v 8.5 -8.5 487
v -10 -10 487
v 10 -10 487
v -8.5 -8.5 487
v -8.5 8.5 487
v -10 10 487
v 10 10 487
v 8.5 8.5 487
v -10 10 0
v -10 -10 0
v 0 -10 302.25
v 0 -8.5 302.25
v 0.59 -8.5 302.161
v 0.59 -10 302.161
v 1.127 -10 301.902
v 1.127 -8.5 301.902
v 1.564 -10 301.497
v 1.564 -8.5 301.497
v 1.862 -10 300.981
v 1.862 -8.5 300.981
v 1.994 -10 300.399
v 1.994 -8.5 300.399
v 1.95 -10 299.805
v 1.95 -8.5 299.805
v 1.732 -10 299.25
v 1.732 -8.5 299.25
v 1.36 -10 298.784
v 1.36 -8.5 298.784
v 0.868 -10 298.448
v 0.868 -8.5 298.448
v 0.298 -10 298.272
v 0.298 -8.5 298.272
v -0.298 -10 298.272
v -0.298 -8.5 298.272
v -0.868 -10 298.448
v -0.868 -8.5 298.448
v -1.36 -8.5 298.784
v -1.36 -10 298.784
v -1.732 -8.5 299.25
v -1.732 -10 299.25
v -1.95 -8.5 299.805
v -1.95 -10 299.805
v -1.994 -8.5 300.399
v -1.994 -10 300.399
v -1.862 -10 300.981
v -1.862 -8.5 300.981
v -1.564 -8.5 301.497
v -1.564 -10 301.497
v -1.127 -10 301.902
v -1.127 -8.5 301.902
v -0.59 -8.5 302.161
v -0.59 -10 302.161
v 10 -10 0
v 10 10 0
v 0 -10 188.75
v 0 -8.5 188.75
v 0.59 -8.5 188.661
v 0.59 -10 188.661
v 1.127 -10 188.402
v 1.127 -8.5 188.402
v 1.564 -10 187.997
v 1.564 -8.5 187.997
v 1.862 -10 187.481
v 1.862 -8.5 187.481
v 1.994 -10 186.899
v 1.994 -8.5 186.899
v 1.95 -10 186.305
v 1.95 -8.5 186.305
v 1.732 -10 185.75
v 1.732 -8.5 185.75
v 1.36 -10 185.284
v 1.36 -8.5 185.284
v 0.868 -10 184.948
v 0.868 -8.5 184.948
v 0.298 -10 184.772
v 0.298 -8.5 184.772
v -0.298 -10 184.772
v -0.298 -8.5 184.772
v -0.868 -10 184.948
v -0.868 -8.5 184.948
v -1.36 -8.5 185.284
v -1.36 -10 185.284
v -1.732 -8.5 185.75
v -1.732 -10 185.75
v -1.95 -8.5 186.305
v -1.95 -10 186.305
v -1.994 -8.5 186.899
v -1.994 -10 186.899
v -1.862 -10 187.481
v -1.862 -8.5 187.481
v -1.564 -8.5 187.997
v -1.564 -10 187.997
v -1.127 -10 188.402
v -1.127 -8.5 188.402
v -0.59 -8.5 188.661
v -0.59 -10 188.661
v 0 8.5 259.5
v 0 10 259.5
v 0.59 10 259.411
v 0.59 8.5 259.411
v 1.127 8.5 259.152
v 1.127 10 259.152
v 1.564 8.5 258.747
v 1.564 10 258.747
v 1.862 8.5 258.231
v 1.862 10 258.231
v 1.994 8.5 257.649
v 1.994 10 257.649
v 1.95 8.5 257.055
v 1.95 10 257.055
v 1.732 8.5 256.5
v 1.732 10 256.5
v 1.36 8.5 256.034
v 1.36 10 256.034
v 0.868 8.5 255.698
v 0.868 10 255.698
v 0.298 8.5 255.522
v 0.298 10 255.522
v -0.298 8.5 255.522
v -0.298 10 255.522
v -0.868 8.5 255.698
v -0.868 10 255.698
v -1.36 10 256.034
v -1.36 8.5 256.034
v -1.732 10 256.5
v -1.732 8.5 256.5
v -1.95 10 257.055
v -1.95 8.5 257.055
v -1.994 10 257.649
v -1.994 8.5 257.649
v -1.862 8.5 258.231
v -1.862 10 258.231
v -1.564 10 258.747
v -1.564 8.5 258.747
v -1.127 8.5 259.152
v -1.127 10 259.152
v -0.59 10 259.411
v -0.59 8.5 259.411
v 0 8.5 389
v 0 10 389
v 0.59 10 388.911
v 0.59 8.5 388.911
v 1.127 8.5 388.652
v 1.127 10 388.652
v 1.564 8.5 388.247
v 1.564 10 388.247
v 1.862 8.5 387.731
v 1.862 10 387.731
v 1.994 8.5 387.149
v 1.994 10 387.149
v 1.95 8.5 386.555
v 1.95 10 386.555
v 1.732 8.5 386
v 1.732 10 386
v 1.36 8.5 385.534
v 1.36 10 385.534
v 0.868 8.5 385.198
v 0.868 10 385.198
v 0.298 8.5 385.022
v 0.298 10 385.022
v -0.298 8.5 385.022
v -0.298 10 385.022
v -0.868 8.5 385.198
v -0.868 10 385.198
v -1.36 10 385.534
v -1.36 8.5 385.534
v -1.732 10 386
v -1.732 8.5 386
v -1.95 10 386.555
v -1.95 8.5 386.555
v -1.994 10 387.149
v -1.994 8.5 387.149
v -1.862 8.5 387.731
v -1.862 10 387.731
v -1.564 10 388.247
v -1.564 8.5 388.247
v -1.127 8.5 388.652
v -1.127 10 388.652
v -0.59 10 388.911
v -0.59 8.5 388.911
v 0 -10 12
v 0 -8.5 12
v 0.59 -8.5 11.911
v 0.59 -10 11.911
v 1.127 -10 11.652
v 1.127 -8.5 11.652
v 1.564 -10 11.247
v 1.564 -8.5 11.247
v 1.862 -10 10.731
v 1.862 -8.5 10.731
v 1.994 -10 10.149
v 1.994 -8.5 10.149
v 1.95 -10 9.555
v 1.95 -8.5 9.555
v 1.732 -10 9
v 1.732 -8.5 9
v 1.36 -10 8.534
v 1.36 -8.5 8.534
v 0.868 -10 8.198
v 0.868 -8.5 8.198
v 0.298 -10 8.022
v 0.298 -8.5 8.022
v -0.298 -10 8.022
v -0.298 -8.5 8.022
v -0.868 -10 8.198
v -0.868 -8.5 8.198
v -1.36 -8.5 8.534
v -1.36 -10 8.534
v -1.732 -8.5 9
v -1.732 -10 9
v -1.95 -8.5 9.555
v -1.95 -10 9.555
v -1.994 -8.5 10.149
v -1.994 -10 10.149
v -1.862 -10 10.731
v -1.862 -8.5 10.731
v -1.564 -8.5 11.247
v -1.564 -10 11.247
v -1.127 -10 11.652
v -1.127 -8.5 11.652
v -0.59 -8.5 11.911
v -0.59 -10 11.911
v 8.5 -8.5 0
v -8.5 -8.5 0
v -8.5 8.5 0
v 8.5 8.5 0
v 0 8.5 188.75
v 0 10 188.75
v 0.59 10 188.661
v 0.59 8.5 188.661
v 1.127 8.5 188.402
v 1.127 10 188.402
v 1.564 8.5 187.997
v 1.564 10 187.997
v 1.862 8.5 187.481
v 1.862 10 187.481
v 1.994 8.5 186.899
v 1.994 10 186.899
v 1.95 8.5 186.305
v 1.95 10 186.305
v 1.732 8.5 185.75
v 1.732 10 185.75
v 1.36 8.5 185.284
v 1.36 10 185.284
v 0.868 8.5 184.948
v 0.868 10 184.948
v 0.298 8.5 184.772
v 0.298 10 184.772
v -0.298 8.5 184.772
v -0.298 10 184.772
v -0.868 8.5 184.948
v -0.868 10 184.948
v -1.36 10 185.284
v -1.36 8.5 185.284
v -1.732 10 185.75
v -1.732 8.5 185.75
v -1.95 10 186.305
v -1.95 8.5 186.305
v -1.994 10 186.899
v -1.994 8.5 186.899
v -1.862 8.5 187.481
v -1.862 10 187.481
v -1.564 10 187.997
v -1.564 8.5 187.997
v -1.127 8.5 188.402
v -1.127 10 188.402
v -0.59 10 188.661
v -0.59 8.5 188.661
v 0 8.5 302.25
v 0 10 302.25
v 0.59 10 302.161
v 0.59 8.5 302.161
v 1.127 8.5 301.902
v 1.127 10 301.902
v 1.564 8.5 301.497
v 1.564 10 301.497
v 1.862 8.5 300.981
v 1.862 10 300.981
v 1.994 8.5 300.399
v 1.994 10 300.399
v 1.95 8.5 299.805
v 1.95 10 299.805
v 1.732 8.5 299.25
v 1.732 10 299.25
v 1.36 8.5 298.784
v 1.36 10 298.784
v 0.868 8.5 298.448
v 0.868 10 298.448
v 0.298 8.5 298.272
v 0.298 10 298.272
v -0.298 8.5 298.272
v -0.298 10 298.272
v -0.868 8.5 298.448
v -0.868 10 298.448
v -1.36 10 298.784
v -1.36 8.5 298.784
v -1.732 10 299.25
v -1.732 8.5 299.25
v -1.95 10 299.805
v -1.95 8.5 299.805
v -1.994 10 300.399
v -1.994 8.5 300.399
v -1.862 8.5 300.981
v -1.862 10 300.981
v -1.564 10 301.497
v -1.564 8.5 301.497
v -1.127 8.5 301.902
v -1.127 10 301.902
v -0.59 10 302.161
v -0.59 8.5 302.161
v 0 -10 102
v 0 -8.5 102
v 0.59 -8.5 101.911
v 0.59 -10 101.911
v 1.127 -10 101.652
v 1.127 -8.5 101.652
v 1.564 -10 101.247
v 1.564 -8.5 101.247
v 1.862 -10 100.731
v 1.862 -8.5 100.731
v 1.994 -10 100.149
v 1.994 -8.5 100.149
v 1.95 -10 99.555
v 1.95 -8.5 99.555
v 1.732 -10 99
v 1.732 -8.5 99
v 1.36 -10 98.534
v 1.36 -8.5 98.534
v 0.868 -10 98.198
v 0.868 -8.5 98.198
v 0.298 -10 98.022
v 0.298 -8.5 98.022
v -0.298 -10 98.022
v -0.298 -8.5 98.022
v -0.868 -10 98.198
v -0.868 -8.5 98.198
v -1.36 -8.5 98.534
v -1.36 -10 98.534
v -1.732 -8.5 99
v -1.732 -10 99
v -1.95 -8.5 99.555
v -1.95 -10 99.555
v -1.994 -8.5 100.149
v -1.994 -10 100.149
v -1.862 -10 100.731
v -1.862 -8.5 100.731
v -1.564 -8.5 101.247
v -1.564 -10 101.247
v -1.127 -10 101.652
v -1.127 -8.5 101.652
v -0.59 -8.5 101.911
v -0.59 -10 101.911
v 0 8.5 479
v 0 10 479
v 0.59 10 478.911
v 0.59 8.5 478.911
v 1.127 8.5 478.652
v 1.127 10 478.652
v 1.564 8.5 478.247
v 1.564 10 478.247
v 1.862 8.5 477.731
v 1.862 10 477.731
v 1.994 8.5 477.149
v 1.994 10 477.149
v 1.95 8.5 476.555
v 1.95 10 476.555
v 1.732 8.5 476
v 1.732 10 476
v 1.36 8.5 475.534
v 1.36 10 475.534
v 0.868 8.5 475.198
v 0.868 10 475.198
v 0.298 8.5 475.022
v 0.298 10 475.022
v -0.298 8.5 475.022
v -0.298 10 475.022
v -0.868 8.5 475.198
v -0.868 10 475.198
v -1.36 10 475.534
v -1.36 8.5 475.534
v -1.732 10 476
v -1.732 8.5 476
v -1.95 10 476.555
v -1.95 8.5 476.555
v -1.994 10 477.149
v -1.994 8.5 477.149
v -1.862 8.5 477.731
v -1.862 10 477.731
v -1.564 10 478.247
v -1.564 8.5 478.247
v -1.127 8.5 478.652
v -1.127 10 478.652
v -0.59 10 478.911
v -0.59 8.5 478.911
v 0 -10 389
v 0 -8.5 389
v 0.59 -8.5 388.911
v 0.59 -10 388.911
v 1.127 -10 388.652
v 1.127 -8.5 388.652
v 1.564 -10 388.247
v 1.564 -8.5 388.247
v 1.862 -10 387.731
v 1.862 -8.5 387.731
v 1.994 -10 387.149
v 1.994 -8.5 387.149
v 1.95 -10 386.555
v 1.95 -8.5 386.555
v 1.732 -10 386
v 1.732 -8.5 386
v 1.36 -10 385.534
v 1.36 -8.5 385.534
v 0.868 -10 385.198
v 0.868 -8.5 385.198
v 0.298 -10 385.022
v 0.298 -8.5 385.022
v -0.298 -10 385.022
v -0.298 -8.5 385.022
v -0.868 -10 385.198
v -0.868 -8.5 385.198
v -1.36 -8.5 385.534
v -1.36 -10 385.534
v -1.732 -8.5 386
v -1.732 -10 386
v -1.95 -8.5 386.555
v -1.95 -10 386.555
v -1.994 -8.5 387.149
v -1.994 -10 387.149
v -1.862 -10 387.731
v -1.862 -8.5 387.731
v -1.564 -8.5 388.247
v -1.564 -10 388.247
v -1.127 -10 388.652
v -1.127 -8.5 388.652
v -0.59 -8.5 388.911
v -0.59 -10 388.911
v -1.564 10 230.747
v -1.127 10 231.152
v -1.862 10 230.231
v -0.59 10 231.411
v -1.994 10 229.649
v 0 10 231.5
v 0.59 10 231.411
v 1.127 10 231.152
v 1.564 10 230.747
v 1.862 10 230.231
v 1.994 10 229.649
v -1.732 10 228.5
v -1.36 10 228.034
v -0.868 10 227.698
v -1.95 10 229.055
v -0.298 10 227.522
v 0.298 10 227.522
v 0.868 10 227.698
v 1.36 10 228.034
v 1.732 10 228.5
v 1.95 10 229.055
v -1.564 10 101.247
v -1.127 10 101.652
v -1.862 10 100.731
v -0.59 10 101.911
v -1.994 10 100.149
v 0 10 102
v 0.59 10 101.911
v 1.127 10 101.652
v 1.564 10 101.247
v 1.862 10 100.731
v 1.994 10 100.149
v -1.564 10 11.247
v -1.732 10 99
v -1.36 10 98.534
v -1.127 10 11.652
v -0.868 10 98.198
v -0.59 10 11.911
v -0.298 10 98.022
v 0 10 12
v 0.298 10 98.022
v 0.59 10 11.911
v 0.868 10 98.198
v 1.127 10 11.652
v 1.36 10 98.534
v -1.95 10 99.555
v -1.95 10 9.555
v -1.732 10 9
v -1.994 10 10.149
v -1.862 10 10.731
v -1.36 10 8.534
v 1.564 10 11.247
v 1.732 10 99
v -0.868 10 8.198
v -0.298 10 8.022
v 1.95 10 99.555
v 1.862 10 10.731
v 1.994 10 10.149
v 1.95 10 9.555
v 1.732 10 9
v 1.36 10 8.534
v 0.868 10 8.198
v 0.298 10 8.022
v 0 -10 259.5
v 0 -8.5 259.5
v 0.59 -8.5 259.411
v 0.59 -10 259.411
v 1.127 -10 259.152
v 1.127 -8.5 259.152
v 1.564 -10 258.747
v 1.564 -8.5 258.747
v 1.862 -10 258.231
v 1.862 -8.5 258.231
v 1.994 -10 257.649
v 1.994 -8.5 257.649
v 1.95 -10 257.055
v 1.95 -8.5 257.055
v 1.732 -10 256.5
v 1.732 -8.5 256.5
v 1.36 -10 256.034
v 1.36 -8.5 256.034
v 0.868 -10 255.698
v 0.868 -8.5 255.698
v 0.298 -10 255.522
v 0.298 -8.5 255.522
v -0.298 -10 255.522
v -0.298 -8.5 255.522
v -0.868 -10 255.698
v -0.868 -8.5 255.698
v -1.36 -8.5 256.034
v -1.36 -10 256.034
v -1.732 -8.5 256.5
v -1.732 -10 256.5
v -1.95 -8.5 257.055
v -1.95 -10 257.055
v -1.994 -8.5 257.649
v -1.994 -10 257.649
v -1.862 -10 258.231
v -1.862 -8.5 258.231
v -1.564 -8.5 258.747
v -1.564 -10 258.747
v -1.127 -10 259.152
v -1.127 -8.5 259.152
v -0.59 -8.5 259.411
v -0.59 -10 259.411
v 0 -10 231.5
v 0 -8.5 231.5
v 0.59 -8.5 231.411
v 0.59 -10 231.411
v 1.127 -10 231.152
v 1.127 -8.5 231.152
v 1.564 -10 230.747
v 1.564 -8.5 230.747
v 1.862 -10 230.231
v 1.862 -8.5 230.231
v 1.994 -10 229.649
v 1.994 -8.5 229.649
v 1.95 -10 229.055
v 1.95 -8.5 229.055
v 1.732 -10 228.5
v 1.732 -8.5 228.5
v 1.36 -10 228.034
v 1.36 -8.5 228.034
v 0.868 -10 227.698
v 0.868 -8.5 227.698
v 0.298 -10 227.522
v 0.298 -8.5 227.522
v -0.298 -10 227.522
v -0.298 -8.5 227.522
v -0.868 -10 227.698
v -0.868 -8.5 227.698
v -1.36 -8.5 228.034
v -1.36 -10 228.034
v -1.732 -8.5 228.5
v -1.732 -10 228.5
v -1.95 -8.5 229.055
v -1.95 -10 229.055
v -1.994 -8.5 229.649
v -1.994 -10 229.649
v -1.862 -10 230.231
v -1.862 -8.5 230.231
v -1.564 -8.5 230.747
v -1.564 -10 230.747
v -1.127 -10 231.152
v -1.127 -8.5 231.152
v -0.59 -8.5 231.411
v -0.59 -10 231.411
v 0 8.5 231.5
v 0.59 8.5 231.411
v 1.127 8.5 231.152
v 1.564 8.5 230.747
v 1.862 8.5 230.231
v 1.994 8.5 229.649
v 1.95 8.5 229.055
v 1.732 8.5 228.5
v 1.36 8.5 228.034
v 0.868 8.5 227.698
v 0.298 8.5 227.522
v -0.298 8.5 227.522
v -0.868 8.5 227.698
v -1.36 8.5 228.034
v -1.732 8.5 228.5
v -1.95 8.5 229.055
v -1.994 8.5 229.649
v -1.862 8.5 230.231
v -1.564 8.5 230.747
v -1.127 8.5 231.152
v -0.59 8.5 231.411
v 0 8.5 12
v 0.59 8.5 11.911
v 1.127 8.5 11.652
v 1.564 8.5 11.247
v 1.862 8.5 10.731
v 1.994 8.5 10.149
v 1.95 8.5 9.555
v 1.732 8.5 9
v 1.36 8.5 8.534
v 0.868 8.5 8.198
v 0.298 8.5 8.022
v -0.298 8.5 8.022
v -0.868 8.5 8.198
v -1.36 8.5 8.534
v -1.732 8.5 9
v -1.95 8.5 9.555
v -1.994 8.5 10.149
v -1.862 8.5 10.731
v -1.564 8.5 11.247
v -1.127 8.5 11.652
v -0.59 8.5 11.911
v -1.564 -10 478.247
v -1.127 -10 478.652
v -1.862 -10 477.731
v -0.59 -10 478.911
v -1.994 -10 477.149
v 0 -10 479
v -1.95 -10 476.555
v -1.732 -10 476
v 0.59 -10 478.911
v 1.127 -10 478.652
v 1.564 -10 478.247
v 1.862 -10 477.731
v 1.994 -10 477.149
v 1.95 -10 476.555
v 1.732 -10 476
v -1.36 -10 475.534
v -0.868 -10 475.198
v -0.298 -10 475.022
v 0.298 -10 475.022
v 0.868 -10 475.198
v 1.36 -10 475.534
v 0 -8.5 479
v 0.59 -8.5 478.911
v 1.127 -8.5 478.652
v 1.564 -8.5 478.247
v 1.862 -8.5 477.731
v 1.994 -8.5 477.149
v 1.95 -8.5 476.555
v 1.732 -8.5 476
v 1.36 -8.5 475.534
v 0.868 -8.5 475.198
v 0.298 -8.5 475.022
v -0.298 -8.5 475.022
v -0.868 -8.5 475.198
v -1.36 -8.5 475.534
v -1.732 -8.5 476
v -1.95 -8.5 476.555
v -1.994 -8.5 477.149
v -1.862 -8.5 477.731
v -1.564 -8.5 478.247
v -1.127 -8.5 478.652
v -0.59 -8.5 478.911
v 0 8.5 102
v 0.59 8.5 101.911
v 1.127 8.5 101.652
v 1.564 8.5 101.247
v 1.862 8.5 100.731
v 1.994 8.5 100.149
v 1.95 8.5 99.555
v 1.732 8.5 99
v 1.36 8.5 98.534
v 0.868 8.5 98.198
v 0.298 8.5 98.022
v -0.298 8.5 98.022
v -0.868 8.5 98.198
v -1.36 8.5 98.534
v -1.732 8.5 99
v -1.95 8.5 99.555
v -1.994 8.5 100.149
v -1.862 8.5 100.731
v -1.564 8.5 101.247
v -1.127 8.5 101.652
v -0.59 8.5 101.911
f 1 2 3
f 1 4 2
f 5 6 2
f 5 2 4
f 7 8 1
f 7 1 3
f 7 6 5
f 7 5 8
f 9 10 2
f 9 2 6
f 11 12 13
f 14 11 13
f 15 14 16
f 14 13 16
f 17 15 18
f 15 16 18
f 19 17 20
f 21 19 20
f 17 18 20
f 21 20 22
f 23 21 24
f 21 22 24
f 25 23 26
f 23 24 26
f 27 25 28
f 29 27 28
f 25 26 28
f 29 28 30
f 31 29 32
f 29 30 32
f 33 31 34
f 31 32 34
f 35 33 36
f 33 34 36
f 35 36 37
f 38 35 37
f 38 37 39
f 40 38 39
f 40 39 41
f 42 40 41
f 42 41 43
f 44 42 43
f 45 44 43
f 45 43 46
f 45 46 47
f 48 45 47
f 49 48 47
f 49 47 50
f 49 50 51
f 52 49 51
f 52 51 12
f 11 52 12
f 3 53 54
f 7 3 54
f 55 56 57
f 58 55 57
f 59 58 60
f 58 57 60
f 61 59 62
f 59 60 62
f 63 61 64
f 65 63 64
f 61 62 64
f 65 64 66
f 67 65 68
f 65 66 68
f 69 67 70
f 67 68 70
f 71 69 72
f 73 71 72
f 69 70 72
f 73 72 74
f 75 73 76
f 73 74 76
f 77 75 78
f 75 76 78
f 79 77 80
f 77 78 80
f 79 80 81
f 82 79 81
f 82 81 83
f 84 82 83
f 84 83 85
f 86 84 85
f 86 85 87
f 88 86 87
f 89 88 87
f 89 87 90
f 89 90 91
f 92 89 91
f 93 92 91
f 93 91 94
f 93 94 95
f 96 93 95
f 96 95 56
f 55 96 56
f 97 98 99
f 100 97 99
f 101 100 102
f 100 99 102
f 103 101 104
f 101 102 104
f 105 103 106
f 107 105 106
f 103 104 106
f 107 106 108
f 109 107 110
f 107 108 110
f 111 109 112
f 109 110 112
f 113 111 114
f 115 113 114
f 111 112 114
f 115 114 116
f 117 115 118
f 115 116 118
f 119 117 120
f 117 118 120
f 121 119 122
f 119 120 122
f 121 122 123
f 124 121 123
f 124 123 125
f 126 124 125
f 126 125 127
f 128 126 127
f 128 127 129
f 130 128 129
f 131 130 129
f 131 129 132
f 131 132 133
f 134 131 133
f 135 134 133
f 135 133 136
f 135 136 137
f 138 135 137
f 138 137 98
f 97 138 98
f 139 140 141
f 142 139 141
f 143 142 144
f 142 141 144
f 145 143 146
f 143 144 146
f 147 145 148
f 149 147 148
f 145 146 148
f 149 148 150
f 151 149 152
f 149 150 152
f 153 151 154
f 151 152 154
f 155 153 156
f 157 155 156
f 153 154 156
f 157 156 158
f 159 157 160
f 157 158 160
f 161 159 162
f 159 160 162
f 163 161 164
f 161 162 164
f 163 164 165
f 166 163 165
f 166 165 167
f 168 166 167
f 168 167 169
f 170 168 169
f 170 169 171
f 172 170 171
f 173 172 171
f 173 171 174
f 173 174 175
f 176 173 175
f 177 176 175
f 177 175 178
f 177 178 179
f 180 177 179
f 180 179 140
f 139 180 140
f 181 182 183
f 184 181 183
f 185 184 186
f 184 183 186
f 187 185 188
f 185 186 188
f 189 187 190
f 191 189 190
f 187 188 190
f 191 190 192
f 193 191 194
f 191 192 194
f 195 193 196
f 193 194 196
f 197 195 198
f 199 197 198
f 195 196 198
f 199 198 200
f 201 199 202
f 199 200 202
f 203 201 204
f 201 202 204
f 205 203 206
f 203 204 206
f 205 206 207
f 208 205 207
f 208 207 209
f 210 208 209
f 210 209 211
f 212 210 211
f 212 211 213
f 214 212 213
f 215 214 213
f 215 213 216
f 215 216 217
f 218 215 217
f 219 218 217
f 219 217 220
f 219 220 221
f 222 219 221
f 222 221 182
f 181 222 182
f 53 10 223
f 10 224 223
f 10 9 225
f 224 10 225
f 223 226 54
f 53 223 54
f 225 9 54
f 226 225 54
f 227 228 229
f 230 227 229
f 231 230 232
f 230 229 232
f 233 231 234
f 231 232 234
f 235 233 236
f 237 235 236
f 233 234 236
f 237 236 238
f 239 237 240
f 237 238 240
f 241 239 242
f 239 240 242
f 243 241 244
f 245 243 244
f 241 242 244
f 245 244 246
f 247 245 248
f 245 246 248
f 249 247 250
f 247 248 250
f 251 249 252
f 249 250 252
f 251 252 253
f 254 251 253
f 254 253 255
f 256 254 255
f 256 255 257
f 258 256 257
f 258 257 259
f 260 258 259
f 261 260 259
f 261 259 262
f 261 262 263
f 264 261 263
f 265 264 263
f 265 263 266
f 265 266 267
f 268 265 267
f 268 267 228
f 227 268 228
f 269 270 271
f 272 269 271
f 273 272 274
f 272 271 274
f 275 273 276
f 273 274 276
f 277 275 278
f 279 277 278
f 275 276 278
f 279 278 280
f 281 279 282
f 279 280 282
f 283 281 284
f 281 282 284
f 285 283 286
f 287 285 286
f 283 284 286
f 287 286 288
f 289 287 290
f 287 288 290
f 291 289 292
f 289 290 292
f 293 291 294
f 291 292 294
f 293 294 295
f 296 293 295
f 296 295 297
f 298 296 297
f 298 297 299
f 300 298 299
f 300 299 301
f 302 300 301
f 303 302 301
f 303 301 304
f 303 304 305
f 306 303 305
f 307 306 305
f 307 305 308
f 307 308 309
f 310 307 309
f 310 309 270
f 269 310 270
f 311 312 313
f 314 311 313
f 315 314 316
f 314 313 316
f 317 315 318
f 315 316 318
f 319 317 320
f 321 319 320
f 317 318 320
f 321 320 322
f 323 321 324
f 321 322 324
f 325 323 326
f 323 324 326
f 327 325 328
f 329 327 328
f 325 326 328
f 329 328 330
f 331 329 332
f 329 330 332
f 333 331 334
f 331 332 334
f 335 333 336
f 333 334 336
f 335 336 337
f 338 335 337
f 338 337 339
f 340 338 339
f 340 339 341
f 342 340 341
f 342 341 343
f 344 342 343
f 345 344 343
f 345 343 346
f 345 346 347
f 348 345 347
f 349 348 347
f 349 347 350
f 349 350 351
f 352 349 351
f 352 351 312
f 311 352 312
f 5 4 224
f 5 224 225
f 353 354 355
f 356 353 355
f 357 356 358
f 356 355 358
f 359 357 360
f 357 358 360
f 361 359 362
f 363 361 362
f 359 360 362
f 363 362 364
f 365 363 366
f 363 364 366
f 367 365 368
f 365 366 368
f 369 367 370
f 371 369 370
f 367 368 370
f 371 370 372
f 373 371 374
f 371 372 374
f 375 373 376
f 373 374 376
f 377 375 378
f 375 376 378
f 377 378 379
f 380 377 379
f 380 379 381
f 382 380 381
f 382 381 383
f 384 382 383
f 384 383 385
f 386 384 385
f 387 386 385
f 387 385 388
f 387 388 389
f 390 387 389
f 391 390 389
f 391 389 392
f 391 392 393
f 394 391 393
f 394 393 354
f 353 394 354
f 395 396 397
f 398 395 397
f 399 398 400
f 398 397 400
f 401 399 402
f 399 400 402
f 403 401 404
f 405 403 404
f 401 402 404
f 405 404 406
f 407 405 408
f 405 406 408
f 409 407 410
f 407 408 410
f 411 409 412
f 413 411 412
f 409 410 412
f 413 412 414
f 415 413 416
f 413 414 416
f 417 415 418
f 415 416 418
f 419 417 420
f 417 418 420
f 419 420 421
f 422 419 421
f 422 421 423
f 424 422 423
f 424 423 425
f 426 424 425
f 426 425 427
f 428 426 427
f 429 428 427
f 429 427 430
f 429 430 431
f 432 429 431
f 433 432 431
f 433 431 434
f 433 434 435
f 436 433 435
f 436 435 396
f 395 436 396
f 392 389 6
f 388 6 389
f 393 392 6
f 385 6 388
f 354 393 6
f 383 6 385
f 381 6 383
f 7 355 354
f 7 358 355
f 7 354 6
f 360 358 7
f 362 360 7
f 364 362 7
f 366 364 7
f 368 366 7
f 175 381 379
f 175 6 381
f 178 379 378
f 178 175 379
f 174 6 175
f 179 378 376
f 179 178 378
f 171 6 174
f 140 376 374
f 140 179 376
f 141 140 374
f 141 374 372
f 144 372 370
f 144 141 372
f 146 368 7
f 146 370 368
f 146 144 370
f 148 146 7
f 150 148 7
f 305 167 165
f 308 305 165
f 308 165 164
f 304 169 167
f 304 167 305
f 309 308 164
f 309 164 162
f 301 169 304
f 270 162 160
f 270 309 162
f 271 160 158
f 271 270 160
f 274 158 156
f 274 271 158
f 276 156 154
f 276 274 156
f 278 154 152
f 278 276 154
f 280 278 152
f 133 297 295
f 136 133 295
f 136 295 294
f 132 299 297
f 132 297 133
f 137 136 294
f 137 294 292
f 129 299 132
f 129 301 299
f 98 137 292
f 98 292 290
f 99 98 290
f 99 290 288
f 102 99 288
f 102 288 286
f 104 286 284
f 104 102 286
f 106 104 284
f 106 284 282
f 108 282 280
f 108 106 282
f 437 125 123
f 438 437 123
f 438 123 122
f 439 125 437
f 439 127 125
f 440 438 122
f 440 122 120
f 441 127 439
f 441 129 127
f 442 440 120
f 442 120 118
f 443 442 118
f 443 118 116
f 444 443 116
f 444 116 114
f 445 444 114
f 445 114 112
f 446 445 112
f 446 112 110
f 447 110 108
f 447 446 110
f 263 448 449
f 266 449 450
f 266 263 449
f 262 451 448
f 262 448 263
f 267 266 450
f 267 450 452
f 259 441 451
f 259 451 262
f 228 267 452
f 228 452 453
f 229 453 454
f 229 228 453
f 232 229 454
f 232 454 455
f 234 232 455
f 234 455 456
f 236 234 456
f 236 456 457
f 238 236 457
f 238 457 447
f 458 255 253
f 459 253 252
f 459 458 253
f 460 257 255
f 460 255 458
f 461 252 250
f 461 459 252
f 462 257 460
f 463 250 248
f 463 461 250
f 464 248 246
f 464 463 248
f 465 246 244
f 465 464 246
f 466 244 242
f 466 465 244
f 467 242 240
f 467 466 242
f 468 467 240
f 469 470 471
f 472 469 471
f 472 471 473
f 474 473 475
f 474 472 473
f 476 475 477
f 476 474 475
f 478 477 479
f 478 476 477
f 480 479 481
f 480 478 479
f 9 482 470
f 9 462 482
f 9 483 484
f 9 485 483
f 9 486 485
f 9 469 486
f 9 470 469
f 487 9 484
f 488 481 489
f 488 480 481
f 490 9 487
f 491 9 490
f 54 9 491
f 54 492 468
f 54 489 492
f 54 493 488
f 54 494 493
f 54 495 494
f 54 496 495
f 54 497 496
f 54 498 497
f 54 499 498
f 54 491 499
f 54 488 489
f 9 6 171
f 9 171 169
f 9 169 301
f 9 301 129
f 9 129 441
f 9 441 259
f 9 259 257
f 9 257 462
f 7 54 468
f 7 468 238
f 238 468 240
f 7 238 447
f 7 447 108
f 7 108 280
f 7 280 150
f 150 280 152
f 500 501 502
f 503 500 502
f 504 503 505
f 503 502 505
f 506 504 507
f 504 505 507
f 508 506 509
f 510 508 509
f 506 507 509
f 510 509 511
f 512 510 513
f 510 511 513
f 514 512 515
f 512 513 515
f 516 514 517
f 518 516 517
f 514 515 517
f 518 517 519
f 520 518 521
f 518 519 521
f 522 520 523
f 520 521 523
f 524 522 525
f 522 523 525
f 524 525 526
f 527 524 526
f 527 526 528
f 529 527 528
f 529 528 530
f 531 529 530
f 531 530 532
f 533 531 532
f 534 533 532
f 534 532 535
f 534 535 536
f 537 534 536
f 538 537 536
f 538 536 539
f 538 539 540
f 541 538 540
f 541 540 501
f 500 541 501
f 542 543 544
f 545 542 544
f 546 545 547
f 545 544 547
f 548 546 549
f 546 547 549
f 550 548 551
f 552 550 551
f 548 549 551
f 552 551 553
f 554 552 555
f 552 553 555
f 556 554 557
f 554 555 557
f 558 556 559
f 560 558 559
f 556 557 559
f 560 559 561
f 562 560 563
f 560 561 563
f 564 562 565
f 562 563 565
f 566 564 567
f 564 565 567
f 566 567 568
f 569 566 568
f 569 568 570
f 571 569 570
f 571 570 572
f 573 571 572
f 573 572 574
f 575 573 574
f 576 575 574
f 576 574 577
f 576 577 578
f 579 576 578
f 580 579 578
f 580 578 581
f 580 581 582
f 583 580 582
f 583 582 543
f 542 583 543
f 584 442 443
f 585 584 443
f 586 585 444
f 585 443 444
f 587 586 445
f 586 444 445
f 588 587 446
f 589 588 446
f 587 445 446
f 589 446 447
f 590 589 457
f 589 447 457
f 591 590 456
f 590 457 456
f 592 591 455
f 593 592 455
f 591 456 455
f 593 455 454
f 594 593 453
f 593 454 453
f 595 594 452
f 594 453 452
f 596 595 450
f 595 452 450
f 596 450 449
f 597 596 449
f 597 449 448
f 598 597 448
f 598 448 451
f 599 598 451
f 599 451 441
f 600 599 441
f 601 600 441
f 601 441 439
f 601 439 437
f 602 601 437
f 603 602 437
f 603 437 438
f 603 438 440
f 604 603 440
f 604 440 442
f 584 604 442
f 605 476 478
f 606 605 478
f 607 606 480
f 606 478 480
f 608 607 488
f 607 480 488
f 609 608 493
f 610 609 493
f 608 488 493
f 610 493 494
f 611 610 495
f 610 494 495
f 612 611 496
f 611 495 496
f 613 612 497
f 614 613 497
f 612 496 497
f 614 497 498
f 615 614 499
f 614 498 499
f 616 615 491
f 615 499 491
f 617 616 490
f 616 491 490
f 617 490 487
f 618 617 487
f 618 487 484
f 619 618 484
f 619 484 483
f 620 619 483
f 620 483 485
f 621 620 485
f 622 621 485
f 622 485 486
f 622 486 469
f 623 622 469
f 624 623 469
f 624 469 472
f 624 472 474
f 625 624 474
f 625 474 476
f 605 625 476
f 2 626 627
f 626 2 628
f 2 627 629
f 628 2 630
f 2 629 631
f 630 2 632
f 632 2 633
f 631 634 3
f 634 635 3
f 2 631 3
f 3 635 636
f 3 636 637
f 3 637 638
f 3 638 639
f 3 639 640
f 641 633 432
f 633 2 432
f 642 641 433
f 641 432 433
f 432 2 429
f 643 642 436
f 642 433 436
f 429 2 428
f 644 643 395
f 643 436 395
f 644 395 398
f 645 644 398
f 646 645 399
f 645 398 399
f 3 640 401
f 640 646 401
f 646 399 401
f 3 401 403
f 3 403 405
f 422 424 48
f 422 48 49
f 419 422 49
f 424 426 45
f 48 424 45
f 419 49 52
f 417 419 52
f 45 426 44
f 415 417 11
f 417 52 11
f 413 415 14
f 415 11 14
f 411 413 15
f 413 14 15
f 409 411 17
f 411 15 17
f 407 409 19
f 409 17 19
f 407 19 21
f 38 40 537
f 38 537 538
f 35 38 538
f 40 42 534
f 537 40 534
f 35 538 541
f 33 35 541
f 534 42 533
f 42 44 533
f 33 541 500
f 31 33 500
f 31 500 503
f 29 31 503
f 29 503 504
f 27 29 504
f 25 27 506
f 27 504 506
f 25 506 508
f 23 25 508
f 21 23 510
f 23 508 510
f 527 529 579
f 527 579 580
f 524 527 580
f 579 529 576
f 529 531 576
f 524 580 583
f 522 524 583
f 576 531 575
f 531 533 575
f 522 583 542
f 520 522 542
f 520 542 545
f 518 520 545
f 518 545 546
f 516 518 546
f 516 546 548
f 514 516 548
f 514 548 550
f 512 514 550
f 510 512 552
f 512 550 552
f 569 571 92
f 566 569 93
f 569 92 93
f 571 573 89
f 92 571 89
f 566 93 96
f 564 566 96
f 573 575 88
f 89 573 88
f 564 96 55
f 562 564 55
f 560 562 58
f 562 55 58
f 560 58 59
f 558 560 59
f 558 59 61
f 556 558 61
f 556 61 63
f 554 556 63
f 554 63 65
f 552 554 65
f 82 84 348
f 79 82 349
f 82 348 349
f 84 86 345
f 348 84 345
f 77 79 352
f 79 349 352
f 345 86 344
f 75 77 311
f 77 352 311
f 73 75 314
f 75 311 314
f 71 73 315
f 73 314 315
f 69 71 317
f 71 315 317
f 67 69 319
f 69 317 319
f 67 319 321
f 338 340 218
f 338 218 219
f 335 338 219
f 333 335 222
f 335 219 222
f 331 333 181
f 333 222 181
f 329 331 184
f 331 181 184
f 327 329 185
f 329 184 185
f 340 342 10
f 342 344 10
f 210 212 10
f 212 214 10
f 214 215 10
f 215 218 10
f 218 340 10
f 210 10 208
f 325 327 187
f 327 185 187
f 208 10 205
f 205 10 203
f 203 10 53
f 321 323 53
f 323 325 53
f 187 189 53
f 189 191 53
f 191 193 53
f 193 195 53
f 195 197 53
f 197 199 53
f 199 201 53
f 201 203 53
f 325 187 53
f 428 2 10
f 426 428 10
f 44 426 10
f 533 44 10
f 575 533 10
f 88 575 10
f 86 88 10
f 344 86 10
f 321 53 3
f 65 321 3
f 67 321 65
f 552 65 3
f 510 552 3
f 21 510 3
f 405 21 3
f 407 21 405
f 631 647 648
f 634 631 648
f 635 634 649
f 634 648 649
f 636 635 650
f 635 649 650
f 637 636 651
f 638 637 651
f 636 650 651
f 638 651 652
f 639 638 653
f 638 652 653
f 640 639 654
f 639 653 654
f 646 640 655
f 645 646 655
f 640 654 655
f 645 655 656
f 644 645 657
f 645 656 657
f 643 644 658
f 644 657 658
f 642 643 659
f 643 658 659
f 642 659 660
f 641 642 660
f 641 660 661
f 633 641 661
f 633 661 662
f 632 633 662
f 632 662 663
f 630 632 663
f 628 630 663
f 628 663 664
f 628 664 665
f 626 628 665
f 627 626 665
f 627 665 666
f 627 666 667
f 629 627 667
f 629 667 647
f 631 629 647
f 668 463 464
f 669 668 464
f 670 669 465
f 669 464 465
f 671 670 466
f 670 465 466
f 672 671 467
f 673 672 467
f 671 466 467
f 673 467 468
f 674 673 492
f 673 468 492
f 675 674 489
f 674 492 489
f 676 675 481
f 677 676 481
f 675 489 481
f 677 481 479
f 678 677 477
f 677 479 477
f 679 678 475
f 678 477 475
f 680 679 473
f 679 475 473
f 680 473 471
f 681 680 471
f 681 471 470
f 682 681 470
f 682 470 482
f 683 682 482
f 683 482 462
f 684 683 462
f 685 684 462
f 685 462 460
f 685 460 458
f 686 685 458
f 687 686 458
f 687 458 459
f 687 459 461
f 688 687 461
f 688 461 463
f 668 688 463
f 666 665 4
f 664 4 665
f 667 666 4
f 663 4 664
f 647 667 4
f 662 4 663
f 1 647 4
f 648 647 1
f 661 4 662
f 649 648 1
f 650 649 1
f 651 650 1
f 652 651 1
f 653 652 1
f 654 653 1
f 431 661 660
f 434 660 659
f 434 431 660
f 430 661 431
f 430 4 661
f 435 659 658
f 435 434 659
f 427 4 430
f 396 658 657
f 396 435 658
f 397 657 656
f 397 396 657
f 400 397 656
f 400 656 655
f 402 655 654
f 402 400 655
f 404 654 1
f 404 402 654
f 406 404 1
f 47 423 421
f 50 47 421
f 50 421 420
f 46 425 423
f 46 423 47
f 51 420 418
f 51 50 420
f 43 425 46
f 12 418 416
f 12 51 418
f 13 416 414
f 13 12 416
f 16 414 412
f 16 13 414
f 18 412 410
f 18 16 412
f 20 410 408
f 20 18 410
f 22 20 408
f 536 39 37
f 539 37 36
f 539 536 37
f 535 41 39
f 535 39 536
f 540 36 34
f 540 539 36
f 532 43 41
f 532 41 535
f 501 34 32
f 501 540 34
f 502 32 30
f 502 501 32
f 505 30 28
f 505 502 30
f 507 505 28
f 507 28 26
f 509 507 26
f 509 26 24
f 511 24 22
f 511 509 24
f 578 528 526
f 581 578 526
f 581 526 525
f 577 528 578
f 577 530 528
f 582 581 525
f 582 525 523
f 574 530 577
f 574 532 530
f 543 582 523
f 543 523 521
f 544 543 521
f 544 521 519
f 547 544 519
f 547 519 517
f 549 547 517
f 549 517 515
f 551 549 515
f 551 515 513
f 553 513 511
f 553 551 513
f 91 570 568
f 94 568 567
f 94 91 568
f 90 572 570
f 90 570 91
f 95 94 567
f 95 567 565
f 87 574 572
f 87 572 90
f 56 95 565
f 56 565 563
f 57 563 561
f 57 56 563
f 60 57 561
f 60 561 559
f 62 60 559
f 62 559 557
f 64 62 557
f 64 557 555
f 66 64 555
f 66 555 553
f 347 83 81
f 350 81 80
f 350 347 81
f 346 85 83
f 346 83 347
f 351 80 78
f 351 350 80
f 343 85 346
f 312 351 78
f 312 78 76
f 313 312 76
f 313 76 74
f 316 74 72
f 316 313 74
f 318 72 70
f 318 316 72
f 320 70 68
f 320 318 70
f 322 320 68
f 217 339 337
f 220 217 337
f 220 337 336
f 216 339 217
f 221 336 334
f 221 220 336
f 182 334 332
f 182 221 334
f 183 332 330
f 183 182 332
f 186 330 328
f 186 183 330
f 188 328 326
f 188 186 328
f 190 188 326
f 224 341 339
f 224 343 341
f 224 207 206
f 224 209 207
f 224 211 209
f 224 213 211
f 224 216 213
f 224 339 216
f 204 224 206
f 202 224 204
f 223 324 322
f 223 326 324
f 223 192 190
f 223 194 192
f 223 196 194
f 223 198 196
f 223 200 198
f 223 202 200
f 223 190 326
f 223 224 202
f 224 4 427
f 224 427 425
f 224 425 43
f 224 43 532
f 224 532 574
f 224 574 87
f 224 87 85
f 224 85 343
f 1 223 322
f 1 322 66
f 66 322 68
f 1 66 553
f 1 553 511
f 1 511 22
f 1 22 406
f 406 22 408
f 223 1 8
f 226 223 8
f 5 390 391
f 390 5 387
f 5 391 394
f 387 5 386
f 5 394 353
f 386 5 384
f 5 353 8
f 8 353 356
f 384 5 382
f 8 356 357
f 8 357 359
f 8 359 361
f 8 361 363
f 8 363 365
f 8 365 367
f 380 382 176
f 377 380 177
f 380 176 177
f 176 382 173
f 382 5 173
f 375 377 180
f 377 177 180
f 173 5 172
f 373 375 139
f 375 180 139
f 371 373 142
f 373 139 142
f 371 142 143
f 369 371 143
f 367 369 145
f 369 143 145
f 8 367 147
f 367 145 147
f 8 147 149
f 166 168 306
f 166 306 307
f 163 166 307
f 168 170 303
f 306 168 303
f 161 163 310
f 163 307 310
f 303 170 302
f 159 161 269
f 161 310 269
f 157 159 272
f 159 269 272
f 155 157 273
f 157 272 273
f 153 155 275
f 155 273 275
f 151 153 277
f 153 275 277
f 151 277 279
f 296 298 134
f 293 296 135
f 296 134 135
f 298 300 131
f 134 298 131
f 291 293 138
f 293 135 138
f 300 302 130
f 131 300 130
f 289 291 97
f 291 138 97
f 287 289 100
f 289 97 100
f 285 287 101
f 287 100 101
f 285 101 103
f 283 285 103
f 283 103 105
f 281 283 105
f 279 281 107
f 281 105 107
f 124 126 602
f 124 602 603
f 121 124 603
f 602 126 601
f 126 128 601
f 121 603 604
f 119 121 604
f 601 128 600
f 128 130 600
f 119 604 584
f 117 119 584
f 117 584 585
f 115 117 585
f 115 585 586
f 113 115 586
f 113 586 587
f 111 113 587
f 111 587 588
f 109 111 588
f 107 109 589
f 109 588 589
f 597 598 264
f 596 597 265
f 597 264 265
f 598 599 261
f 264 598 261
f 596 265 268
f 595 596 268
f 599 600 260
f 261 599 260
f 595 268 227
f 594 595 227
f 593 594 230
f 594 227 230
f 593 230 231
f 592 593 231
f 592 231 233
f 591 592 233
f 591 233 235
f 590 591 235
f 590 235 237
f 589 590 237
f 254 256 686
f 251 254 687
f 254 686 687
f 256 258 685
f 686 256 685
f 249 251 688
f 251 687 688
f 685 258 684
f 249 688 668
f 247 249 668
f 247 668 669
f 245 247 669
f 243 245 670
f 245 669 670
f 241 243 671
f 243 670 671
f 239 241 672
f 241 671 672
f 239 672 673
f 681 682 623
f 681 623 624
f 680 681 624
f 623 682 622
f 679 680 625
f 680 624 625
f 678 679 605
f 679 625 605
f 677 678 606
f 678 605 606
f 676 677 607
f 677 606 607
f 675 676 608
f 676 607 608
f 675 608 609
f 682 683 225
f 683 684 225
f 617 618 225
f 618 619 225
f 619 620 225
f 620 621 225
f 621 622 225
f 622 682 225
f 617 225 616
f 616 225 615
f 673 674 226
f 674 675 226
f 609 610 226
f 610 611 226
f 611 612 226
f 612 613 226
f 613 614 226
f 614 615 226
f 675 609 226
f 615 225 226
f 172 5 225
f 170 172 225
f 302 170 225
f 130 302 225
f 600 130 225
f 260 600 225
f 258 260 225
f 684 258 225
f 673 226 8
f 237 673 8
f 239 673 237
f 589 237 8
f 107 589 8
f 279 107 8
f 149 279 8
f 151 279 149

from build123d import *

# Parameters (mm, degrees)
SKETCH_1_W          = 20
SKETCH_1_H          = 20
SKETCH_1_W_2        = 17
SKETCH_1_H_2        = 17
EXTRUDE_1_DEPTH     = 487
SKETCH_3_R          = 2
CUT_EXTRUDE_2_DEPTH = 20
SKETCH_4_R          = 2
CUT_EXTRUDE_3_DEPTH = 20


with BuildPart() as part:
    # 草图1 → 凸台-拉伸1 (new body)
    with BuildSketch(Plane.XY):
        Rectangle(SKETCH_1_W, SKETCH_1_H)
        Rectangle(SKETCH_1_W_2, SKETCH_1_H_2, mode=Mode.SUBTRACT)
    extrude(amount=EXTRUDE_1_DEPTH)

    # 草图3 → 切除-拉伸2 (cut)
    with BuildSketch(Plane(origin=(0, 10, 0), x_dir=(1, 0, 0), z_dir=(0, 1, 0))):
        with Locations(Location((0, -10, 0), (0, 0, 270))):
            Circle(SKETCH_3_R)
        with Locations(Location((0, -477, 0), (0, 0, 270))):
            Circle(SKETCH_3_R)
        with Locations(Location((0, -100, 0), (0, 0, 270))):
            Circle(SKETCH_3_R)
        with Locations(Location((0, -387, 0), (0, 0, 270))):
            Circle(SKETCH_3_R)
        with Locations(Location((0, -186.75, 0), (0, 0, 270))):
            Circle(SKETCH_3_R)
        with Locations(Location((0, -300.25, 0), (0, 0, 270))):
            Circle(SKETCH_3_R)
    extrude(amount=-CUT_EXTRUDE_2_DEPTH, mode=Mode.SUBTRACT)

    # 草图4 → 切除-拉伸3 (cut)
    with BuildSketch(Plane(origin=(0, 10, 0), x_dir=(1, 0, 0), z_dir=(0, 1, 0))):
        with Locations(Location((0, -229.5, 0), (0, 0, 270))):
            Circle(SKETCH_4_R)
        with Locations(Location((0, -257.5, 0), (0, 0, 270))):
            Circle(SKETCH_4_R)
    extrude(amount=-CUT_EXTRUDE_3_DEPTH, mode=Mode.SUBTRACT)


solid = part.part
